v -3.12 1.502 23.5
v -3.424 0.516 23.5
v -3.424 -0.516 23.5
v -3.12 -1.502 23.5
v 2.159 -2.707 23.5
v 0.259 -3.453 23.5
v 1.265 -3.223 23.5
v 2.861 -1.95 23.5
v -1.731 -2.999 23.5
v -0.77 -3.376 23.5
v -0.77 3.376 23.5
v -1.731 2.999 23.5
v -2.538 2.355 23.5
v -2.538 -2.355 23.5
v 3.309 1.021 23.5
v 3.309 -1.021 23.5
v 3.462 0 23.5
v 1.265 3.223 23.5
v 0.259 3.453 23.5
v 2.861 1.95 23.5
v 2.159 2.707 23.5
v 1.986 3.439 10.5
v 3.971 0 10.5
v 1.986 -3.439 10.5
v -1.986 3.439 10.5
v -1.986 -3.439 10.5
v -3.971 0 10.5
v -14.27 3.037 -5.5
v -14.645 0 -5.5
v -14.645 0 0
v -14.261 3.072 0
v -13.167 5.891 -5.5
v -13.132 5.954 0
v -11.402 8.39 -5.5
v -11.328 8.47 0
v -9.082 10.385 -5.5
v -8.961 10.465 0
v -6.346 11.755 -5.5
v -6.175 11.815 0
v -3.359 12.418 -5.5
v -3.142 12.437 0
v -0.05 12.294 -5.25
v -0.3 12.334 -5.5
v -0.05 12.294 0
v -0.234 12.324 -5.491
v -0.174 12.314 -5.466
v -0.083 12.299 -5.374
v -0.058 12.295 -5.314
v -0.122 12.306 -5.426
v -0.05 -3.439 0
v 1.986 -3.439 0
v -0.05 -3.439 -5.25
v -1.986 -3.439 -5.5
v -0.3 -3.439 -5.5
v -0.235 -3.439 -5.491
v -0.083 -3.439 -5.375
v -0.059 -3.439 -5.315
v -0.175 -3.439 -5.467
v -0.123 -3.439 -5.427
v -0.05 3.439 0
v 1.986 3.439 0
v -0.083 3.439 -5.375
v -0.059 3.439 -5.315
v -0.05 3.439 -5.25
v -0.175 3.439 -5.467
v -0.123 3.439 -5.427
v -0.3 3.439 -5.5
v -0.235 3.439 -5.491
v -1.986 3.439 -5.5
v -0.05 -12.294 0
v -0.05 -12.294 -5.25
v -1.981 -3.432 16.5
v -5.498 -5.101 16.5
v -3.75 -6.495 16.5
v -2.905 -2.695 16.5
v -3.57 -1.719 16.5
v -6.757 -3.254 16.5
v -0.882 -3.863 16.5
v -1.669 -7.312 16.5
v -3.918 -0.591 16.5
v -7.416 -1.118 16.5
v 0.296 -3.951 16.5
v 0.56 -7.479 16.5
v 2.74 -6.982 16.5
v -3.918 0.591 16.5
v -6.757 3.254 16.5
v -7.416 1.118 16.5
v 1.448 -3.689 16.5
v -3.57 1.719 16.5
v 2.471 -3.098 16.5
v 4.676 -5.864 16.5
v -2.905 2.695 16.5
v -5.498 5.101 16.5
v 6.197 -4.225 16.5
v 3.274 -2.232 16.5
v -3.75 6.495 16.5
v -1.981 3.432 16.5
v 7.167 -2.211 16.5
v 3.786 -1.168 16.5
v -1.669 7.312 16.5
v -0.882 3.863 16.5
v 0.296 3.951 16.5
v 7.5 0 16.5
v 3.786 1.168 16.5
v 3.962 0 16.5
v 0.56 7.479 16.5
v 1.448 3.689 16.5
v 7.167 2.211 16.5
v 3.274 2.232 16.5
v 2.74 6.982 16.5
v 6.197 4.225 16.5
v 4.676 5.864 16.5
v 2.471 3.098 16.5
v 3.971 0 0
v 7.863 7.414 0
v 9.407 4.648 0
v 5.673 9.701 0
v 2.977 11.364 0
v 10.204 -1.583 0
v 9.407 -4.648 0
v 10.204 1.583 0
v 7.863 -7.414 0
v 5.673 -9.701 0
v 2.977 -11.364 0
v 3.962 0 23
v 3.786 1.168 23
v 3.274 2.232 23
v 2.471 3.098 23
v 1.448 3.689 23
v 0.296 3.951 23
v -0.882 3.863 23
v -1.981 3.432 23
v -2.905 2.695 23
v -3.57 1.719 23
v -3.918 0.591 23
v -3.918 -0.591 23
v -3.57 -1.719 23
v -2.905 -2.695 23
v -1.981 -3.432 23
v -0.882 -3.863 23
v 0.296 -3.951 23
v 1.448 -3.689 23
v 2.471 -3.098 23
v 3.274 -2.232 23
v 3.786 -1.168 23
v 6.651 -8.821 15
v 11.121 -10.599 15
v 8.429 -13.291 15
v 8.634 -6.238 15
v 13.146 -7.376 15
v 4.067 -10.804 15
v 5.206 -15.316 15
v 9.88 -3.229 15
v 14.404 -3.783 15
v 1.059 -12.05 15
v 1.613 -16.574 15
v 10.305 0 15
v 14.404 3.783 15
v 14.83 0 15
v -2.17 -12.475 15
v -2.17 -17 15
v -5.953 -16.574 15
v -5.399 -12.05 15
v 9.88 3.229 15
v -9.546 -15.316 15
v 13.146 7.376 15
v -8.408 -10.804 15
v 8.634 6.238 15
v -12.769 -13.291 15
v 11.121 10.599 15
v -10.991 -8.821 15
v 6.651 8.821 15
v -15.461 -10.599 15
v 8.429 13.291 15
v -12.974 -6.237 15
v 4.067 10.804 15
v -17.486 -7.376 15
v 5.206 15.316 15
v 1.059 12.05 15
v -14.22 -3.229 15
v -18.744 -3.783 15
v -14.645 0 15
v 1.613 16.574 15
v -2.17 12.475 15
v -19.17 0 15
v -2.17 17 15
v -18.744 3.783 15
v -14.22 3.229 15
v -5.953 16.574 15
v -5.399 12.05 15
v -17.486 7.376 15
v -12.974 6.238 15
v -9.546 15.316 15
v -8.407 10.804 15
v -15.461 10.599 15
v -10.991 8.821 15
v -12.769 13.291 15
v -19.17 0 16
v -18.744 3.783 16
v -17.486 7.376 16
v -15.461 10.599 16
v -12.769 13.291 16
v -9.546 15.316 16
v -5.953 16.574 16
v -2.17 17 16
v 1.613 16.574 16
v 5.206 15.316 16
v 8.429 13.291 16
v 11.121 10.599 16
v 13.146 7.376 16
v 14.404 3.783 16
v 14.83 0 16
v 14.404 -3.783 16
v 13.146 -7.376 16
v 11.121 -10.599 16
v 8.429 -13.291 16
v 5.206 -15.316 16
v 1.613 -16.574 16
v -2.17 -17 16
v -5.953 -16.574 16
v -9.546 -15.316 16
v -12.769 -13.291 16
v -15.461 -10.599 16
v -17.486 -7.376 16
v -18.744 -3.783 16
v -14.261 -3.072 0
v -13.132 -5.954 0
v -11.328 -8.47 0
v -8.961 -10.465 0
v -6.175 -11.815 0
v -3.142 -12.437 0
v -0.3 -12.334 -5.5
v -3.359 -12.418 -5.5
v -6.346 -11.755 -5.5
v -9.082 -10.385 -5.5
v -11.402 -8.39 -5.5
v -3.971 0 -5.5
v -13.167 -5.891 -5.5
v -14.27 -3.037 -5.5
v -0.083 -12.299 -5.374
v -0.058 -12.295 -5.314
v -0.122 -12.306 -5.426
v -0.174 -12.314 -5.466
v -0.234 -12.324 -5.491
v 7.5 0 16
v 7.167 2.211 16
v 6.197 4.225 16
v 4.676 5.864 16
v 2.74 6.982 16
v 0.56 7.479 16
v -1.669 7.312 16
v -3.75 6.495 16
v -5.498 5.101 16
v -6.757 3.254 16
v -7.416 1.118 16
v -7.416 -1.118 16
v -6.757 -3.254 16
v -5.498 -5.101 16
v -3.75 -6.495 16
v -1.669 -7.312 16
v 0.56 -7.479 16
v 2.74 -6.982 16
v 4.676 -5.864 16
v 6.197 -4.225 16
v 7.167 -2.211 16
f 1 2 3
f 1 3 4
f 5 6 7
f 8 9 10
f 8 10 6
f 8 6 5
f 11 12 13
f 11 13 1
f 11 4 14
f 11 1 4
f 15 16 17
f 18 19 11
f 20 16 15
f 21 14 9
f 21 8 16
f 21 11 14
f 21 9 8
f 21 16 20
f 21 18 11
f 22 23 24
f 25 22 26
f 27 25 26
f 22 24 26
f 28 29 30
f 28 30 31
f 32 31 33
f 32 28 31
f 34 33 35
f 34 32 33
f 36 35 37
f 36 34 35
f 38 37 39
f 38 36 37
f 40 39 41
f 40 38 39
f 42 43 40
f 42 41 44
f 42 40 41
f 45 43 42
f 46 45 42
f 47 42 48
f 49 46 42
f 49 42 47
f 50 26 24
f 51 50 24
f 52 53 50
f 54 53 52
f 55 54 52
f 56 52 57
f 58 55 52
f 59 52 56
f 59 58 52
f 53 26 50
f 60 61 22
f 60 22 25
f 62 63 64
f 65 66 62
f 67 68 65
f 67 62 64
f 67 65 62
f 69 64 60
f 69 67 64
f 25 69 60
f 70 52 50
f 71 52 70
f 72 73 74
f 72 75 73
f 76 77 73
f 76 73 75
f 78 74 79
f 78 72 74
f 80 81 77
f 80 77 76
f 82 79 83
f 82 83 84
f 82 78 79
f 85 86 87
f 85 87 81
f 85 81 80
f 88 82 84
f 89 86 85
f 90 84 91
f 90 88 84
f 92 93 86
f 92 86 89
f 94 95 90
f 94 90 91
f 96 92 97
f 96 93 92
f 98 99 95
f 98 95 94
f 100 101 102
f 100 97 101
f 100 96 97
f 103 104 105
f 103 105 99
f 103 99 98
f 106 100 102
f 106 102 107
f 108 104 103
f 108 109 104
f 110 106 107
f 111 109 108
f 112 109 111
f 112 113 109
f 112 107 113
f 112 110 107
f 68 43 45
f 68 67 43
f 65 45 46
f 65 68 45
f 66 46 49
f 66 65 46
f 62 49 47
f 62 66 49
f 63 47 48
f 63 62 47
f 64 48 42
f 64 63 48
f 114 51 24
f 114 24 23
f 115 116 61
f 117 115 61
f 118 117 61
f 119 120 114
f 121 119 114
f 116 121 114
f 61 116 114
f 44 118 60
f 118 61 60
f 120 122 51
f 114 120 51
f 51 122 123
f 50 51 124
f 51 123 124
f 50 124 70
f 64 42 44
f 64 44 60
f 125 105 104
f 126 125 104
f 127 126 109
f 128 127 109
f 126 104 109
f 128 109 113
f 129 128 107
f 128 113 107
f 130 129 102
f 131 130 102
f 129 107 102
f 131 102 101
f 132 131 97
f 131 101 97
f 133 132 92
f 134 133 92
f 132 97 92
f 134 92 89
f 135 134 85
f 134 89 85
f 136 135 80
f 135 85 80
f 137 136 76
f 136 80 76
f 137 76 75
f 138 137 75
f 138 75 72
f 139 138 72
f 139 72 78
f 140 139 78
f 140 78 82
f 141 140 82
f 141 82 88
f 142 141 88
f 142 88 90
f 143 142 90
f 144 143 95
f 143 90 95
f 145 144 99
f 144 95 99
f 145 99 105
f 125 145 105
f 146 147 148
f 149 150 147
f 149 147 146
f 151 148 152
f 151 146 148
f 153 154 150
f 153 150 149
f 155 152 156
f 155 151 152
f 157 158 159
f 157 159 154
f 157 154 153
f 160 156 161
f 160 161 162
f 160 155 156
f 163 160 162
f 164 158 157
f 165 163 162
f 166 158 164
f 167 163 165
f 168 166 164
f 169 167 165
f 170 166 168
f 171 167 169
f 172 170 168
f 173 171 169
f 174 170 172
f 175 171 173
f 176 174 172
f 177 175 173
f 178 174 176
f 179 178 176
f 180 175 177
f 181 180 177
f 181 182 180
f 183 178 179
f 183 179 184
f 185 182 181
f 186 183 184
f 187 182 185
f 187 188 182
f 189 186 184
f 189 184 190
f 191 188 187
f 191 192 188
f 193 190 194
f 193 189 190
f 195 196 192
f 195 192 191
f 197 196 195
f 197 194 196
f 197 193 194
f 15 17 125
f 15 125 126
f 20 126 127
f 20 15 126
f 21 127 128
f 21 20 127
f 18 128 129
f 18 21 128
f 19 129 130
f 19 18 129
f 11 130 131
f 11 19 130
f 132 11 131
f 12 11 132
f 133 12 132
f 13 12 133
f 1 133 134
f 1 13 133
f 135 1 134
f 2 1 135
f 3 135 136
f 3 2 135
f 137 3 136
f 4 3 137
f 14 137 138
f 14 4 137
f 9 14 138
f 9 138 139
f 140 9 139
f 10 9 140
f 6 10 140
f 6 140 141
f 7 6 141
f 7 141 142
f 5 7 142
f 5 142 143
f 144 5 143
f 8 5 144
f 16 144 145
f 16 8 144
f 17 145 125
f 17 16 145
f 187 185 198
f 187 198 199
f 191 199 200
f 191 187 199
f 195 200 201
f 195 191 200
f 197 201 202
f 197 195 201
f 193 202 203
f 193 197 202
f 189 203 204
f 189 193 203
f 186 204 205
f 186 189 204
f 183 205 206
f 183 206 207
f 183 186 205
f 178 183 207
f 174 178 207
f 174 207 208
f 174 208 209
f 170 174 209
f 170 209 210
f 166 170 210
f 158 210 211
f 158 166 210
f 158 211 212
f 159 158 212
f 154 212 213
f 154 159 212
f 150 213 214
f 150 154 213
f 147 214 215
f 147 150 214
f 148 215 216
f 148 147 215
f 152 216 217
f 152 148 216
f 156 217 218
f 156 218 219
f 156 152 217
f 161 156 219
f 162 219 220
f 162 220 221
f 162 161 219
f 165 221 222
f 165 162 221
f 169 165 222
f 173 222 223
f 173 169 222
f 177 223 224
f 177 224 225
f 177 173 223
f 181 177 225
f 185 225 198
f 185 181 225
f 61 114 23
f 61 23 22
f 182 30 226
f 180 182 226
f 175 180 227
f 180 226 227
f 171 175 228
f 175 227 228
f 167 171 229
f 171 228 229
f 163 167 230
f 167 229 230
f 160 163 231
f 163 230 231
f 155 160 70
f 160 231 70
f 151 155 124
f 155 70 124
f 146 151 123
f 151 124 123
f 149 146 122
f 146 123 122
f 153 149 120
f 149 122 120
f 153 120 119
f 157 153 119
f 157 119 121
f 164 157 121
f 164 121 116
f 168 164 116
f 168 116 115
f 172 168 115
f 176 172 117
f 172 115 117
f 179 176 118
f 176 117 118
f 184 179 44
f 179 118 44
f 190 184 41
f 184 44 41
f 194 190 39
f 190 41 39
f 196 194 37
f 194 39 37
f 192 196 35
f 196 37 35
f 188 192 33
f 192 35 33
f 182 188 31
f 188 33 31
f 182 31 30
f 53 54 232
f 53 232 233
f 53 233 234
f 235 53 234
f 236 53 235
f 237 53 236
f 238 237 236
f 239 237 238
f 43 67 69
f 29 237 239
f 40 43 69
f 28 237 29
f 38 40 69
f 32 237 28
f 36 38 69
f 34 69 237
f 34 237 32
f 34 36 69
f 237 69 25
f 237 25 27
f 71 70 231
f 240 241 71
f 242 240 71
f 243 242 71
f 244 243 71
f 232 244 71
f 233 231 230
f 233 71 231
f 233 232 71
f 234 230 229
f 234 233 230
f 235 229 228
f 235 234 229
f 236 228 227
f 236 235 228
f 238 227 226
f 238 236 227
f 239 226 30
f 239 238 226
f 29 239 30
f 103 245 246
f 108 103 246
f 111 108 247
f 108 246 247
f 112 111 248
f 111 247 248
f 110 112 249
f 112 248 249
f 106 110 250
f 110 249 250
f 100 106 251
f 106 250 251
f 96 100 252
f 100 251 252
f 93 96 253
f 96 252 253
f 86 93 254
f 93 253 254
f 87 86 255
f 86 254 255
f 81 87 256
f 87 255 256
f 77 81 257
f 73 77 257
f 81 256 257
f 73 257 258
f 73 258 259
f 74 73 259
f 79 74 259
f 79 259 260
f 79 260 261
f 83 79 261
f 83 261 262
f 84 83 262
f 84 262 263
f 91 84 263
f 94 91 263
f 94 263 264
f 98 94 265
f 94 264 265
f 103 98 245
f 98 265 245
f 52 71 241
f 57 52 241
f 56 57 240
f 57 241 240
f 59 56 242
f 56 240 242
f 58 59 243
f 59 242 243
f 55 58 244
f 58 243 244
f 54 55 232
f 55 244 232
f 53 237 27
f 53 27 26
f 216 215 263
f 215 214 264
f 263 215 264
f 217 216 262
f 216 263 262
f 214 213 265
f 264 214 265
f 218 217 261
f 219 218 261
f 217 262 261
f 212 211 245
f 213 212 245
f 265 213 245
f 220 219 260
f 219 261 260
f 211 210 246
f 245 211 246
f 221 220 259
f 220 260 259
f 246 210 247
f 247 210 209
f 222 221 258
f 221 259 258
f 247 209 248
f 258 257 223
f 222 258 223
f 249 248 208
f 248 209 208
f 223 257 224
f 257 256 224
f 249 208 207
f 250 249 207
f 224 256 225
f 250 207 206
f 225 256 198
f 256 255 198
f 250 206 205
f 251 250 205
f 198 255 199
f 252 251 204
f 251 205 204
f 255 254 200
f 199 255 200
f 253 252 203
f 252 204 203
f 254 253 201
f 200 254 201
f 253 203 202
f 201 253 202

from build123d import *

# Parameters (mm, degrees)
SKETCH1_R           = 12.475
BOSS_EXTRUDE1_DEPTH = 10.5
SKETCH6_R           = 12.475
BOSS_EXTRUDE7_DEPTH = 4.5
SKETCH3_R           = 17
BOSS_EXTRUDE3_DEPTH = 1
SKETCH4_R           = 7.5
BOSS_EXTRUDE5_DEPTH = 0.5
SKETCH5_R           = 3.9625
BOSS_EXTRUDE6_DEPTH = 7
BOSS_EXTRUDE8_START = 5.5
BOSS_EXTRUDE8_DEPTH = 5.5
CHAMFER1_SIZE       = 0.5
FILLET1_R           = 0.25


with BuildPart() as part:
    # Sketch1 → Boss-Extrude1 (new body)
    # profile 1 of 2: a face of its own
    with BuildSketch(Plane.XY):
        with BuildLine():
            Line((-4, 0), (-2, 3.464101615))
            ThreePointArc((-2, 3.464101615), (-3.464101615, 2), (-4, 0))
        make_face()
    # profile 2 of 2: a face of its own
    with BuildSketch(Plane.XY):
        with Locations(Location((-2.17, 0, 0), (0, 0, 180))):
            Circle(SKETCH1_R)
        Polygon((1.985566243, -3.439101615), (3.971132487, 0), (1.985566243, 3.439101615), (-1.985566243, 3.439101615), (-3.971132487, 0), (-1.985566243, -3.439101615), align=None, mode=Mode.SUBTRACT)
    extrude(amount=BOSS_EXTRUDE1_DEPTH)

    # Sketch6 → Boss-Extrude7 (add)
    with BuildSketch(Plane.XY.offset(10.5)):
        with Locations(Location((-2.17, 0, 0), (0, 0, 180))):
            Circle(SKETCH6_R)
    extrude(amount=BOSS_EXTRUDE7_DEPTH)

    # Sketch3 → Boss-Extrude3 (add)
    with BuildSketch(Plane(origin=(0, 0, 15), x_dir=(-1, 0, 0), z_dir=(0, 0, -1))):
        with Locations((2.17, 0)):
            Circle(SKETCH3_R)
    extrude(amount=-BOSS_EXTRUDE3_DEPTH)

    # Sketch4 → Boss-Extrude5 (add)
    with BuildSketch(Plane.XY.offset(16)):
        Circle(SKETCH4_R)
    extrude(amount=BOSS_EXTRUDE5_DEPTH)

    # Sketch5 → Boss-Extrude6 (add)
    with BuildSketch(Plane.XY.offset(16.5)):
        Circle(SKETCH5_R)
    extrude(amount=BOSS_EXTRUDE6_DEPTH)

    # Sketch7 → Boss-Extrude8 (add)
    with BuildSketch(Plane(origin=(0, 0, 0), x_dir=(-1, 0, 0), z_dir=(0, 0, -1)).offset(BOSS_EXTRUDE8_START)):
        with BuildLine():
            ThreePointArc((14.645, 0), (10.206747632, 9.541295116), (0.05, 12.293544037))
            Line((0.05, 12.293544037), (0.05, 3.439101615))
            Line((0.05, 3.439101615), (1.985566243, 3.439101615))
            Line((1.985566243, 3.439101615), (3.971132487, 0))
            Line((3.971132487, 0), (1.985566243, -3.439101615))
            Line((1.985566243, -3.439101615), (0.05, -3.439101615))
            Line((0.05, -3.439101615), (0.05, -12.293544037))
            ThreePointArc((0.05, -12.293544037), (10.206747632, -9.541295116), (14.645, 0))
        make_face()
    extrude(amount=-BOSS_EXTRUDE8_DEPTH)

    # Chamfer1
    chamfer1_edges = [part.edges().sort_by_distance(p)[0] for p in [
        (-3.9625, 0, 23.5),
    ]]
    chamfer(chamfer1_edges, length=CHAMFER1_SIZE)

    # Fillet1
    fillet1_edges = [part.edges().sort_by_distance(p)[0] for p in [
        (-0.05, 7.866322826, -5.5),
        (-0.05, -7.866322826, -5.5),
    ]]
    fillet(fillet1_edges, radius=FILLET1_R)


solid = part.part
